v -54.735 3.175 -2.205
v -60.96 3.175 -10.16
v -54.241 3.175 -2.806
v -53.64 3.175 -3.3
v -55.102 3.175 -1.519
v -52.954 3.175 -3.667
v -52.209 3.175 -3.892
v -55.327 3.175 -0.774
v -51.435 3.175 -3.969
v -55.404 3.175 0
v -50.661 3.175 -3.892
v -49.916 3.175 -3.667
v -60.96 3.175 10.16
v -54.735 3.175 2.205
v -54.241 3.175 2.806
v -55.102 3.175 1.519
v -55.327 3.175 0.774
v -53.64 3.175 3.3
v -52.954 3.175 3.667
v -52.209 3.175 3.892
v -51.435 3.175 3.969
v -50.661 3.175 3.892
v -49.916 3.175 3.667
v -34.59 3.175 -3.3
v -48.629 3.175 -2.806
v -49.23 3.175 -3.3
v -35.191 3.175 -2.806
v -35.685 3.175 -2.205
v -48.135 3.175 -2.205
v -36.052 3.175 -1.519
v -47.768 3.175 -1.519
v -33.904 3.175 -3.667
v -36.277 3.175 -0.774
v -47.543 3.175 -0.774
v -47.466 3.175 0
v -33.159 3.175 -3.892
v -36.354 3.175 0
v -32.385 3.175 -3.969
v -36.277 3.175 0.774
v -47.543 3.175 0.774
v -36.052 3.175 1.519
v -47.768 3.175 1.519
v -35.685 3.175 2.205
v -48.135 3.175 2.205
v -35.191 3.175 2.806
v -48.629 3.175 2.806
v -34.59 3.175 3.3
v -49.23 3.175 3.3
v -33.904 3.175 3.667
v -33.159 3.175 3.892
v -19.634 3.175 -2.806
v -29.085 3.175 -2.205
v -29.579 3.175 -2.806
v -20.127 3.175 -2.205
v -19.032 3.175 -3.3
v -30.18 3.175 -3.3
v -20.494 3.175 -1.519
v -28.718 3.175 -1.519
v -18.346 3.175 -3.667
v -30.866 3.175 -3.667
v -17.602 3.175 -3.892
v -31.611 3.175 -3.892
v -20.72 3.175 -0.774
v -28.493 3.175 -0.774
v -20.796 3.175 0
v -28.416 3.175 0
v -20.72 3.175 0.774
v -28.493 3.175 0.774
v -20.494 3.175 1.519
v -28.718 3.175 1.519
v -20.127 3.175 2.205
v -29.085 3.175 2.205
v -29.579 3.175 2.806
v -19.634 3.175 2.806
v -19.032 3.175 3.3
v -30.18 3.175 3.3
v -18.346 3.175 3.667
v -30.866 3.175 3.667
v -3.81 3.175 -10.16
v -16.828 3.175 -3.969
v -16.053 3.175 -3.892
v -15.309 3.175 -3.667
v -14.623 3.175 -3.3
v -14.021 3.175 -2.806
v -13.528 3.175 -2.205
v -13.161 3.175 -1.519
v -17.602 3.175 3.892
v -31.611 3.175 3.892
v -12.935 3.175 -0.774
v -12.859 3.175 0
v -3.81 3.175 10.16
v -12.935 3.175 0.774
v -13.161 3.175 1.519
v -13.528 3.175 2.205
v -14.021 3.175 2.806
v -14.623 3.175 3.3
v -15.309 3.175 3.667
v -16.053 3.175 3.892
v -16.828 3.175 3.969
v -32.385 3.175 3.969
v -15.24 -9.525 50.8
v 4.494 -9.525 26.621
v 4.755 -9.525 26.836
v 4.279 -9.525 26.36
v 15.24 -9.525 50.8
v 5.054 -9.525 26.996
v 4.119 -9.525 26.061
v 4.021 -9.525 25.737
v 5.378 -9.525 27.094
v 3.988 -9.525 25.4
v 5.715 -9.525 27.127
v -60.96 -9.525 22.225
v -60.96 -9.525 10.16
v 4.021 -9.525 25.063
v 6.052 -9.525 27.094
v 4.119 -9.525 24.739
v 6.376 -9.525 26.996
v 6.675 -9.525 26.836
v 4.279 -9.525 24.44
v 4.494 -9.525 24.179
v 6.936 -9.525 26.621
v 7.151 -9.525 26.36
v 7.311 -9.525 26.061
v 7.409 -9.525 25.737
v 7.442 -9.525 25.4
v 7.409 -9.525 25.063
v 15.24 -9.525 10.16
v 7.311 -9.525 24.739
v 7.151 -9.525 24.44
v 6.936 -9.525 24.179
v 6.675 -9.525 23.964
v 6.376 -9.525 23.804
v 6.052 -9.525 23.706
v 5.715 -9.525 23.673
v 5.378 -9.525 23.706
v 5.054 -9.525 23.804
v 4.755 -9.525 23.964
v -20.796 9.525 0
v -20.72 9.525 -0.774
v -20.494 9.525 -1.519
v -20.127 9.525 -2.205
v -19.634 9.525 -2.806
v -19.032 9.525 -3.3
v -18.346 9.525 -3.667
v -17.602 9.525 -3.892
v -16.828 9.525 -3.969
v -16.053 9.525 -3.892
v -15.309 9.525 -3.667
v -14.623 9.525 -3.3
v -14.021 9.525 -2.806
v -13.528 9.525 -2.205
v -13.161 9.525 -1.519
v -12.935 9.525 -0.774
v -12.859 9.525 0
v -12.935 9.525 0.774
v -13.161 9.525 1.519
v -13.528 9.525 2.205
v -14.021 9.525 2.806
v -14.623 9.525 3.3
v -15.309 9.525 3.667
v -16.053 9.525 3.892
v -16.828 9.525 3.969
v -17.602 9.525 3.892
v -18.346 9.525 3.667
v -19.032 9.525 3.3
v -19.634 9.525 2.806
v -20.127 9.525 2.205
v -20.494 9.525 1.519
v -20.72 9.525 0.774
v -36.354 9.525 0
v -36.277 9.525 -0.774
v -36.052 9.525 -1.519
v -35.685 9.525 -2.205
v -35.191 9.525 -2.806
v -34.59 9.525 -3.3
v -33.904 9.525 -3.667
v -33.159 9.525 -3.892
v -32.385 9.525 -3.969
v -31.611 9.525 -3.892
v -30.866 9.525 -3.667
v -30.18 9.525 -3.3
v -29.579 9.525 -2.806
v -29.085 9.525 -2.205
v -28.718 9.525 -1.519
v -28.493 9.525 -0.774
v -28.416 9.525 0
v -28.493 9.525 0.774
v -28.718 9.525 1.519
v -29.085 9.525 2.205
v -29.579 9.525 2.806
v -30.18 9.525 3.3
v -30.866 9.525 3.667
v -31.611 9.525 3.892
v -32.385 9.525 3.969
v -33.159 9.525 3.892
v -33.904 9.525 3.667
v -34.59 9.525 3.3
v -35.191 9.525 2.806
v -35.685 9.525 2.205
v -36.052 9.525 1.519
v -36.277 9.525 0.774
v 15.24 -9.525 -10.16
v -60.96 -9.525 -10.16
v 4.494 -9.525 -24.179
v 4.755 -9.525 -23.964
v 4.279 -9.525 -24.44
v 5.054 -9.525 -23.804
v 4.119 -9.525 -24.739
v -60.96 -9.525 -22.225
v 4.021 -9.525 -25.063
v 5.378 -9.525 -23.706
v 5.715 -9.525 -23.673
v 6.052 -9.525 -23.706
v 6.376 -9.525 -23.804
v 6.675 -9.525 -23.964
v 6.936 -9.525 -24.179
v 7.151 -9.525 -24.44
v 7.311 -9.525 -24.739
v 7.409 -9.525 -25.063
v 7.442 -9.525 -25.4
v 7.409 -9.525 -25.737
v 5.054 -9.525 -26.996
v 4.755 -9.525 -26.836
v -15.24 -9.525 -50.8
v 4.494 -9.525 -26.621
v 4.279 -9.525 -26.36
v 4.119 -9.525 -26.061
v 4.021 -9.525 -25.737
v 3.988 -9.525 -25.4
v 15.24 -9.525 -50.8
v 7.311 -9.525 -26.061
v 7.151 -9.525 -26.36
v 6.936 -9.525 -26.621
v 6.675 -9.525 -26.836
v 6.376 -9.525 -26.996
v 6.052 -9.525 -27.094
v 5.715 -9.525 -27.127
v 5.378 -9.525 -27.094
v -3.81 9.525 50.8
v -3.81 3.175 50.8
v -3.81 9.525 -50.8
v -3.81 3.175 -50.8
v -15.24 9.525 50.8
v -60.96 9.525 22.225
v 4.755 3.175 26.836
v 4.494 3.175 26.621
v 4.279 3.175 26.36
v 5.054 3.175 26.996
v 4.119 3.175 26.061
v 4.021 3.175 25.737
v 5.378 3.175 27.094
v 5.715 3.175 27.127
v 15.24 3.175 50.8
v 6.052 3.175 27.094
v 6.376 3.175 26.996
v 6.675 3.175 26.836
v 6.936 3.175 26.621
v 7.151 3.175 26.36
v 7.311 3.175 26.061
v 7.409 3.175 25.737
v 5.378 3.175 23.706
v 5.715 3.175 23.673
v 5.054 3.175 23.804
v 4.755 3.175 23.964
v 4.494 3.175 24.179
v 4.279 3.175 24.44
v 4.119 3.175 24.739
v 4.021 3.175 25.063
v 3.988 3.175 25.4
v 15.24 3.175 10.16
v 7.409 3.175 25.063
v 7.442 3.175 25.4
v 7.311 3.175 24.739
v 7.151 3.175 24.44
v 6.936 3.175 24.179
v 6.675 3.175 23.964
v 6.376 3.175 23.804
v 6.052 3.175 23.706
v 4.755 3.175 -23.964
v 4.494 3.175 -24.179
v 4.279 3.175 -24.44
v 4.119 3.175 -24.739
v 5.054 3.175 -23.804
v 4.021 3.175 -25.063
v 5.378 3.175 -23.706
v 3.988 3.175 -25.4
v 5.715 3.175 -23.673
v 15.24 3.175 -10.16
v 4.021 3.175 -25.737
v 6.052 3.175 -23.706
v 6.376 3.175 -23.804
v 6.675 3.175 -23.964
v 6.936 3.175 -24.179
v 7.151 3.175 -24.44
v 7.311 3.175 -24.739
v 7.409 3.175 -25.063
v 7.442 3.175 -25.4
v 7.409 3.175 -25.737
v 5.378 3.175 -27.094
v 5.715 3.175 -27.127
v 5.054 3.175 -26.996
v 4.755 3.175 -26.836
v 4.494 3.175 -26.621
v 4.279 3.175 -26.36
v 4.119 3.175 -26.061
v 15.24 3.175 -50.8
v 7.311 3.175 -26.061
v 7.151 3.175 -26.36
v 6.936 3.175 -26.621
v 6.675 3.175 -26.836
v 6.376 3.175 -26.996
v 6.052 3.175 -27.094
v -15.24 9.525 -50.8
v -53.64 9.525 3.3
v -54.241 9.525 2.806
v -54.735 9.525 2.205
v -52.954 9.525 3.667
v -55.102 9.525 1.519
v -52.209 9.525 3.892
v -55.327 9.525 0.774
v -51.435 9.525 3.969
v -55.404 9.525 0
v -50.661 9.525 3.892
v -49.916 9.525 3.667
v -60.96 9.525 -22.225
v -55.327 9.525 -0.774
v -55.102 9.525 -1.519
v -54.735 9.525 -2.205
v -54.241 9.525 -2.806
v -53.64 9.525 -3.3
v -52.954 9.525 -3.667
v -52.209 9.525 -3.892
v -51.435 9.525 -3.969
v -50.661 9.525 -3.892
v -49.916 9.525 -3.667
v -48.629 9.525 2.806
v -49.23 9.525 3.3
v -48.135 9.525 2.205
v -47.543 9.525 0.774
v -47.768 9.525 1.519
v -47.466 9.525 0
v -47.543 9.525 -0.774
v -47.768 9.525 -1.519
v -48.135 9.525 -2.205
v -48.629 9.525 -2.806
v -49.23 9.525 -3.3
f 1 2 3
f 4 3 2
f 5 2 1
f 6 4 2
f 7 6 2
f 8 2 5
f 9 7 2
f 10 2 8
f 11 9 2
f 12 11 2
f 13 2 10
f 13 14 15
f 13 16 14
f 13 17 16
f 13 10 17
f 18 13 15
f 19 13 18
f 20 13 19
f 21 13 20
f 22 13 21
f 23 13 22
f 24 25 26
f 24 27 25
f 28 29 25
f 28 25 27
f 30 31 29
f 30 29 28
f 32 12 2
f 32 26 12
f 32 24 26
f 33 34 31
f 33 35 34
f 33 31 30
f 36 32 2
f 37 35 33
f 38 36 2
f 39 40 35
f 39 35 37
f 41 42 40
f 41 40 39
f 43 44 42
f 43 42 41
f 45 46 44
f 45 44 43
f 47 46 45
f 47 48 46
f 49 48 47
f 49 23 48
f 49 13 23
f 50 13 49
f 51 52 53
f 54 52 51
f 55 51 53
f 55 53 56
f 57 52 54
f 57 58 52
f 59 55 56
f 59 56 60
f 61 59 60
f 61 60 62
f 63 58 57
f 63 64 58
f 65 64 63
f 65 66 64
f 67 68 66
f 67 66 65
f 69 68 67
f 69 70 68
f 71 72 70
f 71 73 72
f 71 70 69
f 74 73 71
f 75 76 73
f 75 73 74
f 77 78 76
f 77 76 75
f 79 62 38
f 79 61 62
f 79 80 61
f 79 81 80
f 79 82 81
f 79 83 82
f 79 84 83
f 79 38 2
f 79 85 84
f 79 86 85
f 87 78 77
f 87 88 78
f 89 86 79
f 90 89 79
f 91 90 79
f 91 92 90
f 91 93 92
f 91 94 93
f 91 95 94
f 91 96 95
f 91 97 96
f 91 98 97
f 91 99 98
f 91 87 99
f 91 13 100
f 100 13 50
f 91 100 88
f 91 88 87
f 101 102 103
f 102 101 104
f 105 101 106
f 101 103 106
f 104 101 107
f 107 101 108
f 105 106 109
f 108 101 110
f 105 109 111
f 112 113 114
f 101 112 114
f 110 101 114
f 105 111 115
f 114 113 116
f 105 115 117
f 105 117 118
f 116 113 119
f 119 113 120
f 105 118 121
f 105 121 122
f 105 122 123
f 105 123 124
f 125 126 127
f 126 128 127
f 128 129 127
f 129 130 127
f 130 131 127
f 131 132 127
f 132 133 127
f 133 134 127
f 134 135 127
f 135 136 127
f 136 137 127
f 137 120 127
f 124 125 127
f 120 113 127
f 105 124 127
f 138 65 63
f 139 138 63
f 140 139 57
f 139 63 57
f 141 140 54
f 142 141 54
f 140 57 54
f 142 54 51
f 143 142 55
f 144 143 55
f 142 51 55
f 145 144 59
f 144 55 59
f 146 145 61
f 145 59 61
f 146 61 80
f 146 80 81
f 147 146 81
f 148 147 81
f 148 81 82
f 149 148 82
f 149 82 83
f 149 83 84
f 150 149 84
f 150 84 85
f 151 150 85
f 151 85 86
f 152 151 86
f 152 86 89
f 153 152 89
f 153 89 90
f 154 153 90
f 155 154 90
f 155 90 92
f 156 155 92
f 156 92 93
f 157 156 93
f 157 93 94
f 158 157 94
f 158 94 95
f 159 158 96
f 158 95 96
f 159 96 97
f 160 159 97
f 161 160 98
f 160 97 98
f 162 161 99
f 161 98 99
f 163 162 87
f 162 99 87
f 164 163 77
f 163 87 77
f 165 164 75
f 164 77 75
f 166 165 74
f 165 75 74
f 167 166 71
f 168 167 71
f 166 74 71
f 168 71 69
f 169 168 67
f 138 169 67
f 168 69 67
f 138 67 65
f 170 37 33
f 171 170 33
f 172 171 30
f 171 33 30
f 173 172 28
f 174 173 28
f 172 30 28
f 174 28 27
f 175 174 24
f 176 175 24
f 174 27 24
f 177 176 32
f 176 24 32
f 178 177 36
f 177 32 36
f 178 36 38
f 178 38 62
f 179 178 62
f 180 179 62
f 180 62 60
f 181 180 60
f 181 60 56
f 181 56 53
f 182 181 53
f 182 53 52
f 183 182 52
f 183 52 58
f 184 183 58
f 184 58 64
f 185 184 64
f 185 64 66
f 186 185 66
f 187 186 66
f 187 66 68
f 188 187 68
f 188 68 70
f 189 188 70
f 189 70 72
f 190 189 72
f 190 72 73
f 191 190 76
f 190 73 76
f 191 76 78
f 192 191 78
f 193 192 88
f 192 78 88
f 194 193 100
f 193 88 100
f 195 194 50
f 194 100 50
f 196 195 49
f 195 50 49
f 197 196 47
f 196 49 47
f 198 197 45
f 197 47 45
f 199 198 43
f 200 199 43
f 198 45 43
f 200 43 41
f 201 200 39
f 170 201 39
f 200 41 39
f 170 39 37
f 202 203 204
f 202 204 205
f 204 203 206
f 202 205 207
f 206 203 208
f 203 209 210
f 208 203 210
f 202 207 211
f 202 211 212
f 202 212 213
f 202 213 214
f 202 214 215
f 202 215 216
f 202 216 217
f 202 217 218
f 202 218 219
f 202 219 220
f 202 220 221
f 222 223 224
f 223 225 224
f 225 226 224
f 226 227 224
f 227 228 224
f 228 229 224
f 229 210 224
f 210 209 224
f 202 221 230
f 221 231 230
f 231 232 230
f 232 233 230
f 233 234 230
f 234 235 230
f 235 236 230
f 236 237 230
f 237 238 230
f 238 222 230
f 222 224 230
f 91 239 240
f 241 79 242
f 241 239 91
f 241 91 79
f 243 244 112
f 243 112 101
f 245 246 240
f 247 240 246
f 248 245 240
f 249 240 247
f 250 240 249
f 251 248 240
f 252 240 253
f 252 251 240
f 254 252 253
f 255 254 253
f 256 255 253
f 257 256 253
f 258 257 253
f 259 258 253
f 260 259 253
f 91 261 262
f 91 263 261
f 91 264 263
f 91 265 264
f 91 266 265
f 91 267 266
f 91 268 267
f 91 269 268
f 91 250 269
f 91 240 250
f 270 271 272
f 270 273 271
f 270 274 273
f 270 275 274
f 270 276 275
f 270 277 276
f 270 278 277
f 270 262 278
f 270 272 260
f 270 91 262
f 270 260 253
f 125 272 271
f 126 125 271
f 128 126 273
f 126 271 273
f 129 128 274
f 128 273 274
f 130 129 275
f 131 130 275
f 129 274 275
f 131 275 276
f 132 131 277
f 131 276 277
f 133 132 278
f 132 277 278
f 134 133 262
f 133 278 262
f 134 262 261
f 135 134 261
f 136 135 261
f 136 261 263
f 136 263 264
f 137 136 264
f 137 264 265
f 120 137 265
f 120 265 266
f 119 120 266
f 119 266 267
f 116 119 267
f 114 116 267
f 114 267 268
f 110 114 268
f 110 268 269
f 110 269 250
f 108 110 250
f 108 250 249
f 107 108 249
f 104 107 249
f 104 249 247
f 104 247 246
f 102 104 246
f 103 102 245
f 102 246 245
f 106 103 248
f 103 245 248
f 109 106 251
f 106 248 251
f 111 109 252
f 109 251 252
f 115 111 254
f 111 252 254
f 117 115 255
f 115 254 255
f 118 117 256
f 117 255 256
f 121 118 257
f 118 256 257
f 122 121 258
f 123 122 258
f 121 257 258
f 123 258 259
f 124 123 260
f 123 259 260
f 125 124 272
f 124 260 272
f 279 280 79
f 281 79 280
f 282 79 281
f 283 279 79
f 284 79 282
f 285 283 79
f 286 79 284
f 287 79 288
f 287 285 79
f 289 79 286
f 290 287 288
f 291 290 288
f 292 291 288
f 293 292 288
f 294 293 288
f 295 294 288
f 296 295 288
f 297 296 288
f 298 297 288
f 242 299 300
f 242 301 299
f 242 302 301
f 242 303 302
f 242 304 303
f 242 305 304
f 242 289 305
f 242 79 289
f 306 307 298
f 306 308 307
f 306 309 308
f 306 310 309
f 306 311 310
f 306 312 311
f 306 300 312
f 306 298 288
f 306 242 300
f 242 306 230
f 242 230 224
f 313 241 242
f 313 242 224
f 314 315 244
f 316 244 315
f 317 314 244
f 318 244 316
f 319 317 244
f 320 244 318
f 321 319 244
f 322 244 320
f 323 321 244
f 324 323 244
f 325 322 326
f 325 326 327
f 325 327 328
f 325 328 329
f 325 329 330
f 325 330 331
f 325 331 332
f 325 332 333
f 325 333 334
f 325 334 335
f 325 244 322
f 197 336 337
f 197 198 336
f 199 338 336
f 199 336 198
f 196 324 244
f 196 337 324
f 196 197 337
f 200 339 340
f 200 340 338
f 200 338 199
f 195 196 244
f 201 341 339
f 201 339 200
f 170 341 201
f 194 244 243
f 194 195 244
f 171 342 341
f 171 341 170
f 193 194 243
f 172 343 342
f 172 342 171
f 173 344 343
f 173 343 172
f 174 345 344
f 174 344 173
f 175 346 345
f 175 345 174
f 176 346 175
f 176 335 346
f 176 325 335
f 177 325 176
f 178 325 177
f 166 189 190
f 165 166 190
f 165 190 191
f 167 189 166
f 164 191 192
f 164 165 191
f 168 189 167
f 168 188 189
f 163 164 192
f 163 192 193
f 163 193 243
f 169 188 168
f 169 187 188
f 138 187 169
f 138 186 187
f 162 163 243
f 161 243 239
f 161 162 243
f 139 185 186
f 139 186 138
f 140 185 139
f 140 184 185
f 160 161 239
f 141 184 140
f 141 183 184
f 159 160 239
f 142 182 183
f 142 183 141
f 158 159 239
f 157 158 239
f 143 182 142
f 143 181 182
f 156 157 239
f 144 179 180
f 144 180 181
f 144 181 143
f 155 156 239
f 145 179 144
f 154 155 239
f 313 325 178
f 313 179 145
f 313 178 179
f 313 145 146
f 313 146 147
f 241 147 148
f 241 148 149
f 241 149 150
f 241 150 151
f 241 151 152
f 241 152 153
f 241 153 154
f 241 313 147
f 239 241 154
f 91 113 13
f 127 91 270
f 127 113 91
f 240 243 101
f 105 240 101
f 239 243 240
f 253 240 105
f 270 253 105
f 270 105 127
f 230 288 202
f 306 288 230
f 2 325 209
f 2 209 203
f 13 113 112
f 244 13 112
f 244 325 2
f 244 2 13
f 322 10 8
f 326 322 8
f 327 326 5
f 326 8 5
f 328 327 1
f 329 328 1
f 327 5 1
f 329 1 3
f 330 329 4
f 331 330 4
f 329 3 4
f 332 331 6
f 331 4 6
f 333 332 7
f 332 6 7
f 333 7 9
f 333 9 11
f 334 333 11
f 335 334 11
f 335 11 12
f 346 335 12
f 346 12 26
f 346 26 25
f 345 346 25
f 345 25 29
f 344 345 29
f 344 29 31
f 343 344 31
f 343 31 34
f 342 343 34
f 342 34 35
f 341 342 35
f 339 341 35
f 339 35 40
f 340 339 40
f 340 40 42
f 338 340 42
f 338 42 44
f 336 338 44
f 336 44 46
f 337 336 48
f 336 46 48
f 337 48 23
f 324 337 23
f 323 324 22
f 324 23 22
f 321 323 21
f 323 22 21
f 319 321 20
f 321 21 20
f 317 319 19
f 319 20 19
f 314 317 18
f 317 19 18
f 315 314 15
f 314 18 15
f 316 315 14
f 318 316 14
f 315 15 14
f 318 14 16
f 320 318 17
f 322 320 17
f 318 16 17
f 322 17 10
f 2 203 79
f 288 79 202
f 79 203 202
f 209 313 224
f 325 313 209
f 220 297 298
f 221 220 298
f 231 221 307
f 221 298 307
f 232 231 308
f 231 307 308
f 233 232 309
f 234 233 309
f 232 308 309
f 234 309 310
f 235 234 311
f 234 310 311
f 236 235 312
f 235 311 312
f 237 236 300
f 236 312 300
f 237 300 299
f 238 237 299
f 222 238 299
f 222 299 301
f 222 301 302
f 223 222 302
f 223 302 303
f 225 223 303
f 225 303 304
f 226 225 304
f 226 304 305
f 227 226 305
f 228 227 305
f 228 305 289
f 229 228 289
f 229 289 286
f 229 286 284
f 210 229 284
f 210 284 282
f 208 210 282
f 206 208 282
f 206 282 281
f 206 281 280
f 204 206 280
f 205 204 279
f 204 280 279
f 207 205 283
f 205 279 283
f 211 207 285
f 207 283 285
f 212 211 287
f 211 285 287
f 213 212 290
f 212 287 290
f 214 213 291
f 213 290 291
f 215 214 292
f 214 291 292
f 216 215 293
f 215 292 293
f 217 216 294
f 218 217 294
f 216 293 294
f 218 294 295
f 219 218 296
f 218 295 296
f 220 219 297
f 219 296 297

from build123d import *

# Parameters (mm, degrees)
BOSS_EXTRUDE1_DEPTH            = 9.525
SKETCH2_W                      = 76.2
SKETCH2_H                      = 20.32
CUT_EXTRUDE1_DEPTH             = 12.7
SKETCH3_W                      = 19.05
SKETCH3_H                      = 101.6
CUT_EXTRUDE2_DEPTH             = 6.35
F_5_16_0_3125_DIAMETER_HOLE1_D = 7.9375
F_8_32_TAPPED_HOLE1_D          = 3.4544


with BuildPart() as part:
    # Sketch1 → Boss-Extrude1 (new, symmetric)
    with BuildSketch(Plane(origin=(0, 0, 0), x_dir=(1, 0, 0), z_dir=(0, 1, 0))):
        Polygon((-60.96, 22.225), (-60.96, -22.225), (-15.24, -50.8), (15.24, -50.8), (15.24, 50.8), (-15.24, 50.8), align=None)
    extrude(amount=BOSS_EXTRUDE1_DEPTH, both=True)

    # Sketch2 → Cut-Extrude1 (cut)
    with BuildSketch(Plane.XZ.offset(9.525)):
        with Locations((-22.86, 0)):
            Rectangle(SKETCH2_W, SKETCH2_H)
    extrude(amount=-CUT_EXTRUDE1_DEPTH, mode=Mode.SUBTRACT)

    # Sketch3 → Cut-Extrude2 (cut)
    with BuildSketch(Plane(origin=(0, 9.525, 0), x_dir=(1, 0, 0), z_dir=(0, 1, 0))):
        with Locations((5.715, 0)):
            Rectangle(SKETCH3_W, SKETCH3_H)
    extrude(amount=-CUT_EXTRUDE2_DEPTH, mode=Mode.SUBTRACT)

    # 5/16 (0.3125) Diameter Hole1 (through all)
    with Locations(Plane(origin=(0, 9.525, 0), x_dir=(1, 0, 0), z_dir=(0, 1, 0))):
        with Locations((-51.435, 0), (-32.385, 0), (-16.8275, 0)):
            Hole(F_5_16_0_3125_DIAMETER_HOLE1_D / 2)

    # #8-32 Tapped Hole1 (through all)
    with Locations(Plane(origin=(0, -9.525, 0), x_dir=(-1, 0, 0), z_dir=(0, -1, 0))):
        with Locations((-5.715, -25.4), (-5.715, 25.4)):
            Hole(F_8_32_TAPPED_HOLE1_D / 2)


solid = part.part
